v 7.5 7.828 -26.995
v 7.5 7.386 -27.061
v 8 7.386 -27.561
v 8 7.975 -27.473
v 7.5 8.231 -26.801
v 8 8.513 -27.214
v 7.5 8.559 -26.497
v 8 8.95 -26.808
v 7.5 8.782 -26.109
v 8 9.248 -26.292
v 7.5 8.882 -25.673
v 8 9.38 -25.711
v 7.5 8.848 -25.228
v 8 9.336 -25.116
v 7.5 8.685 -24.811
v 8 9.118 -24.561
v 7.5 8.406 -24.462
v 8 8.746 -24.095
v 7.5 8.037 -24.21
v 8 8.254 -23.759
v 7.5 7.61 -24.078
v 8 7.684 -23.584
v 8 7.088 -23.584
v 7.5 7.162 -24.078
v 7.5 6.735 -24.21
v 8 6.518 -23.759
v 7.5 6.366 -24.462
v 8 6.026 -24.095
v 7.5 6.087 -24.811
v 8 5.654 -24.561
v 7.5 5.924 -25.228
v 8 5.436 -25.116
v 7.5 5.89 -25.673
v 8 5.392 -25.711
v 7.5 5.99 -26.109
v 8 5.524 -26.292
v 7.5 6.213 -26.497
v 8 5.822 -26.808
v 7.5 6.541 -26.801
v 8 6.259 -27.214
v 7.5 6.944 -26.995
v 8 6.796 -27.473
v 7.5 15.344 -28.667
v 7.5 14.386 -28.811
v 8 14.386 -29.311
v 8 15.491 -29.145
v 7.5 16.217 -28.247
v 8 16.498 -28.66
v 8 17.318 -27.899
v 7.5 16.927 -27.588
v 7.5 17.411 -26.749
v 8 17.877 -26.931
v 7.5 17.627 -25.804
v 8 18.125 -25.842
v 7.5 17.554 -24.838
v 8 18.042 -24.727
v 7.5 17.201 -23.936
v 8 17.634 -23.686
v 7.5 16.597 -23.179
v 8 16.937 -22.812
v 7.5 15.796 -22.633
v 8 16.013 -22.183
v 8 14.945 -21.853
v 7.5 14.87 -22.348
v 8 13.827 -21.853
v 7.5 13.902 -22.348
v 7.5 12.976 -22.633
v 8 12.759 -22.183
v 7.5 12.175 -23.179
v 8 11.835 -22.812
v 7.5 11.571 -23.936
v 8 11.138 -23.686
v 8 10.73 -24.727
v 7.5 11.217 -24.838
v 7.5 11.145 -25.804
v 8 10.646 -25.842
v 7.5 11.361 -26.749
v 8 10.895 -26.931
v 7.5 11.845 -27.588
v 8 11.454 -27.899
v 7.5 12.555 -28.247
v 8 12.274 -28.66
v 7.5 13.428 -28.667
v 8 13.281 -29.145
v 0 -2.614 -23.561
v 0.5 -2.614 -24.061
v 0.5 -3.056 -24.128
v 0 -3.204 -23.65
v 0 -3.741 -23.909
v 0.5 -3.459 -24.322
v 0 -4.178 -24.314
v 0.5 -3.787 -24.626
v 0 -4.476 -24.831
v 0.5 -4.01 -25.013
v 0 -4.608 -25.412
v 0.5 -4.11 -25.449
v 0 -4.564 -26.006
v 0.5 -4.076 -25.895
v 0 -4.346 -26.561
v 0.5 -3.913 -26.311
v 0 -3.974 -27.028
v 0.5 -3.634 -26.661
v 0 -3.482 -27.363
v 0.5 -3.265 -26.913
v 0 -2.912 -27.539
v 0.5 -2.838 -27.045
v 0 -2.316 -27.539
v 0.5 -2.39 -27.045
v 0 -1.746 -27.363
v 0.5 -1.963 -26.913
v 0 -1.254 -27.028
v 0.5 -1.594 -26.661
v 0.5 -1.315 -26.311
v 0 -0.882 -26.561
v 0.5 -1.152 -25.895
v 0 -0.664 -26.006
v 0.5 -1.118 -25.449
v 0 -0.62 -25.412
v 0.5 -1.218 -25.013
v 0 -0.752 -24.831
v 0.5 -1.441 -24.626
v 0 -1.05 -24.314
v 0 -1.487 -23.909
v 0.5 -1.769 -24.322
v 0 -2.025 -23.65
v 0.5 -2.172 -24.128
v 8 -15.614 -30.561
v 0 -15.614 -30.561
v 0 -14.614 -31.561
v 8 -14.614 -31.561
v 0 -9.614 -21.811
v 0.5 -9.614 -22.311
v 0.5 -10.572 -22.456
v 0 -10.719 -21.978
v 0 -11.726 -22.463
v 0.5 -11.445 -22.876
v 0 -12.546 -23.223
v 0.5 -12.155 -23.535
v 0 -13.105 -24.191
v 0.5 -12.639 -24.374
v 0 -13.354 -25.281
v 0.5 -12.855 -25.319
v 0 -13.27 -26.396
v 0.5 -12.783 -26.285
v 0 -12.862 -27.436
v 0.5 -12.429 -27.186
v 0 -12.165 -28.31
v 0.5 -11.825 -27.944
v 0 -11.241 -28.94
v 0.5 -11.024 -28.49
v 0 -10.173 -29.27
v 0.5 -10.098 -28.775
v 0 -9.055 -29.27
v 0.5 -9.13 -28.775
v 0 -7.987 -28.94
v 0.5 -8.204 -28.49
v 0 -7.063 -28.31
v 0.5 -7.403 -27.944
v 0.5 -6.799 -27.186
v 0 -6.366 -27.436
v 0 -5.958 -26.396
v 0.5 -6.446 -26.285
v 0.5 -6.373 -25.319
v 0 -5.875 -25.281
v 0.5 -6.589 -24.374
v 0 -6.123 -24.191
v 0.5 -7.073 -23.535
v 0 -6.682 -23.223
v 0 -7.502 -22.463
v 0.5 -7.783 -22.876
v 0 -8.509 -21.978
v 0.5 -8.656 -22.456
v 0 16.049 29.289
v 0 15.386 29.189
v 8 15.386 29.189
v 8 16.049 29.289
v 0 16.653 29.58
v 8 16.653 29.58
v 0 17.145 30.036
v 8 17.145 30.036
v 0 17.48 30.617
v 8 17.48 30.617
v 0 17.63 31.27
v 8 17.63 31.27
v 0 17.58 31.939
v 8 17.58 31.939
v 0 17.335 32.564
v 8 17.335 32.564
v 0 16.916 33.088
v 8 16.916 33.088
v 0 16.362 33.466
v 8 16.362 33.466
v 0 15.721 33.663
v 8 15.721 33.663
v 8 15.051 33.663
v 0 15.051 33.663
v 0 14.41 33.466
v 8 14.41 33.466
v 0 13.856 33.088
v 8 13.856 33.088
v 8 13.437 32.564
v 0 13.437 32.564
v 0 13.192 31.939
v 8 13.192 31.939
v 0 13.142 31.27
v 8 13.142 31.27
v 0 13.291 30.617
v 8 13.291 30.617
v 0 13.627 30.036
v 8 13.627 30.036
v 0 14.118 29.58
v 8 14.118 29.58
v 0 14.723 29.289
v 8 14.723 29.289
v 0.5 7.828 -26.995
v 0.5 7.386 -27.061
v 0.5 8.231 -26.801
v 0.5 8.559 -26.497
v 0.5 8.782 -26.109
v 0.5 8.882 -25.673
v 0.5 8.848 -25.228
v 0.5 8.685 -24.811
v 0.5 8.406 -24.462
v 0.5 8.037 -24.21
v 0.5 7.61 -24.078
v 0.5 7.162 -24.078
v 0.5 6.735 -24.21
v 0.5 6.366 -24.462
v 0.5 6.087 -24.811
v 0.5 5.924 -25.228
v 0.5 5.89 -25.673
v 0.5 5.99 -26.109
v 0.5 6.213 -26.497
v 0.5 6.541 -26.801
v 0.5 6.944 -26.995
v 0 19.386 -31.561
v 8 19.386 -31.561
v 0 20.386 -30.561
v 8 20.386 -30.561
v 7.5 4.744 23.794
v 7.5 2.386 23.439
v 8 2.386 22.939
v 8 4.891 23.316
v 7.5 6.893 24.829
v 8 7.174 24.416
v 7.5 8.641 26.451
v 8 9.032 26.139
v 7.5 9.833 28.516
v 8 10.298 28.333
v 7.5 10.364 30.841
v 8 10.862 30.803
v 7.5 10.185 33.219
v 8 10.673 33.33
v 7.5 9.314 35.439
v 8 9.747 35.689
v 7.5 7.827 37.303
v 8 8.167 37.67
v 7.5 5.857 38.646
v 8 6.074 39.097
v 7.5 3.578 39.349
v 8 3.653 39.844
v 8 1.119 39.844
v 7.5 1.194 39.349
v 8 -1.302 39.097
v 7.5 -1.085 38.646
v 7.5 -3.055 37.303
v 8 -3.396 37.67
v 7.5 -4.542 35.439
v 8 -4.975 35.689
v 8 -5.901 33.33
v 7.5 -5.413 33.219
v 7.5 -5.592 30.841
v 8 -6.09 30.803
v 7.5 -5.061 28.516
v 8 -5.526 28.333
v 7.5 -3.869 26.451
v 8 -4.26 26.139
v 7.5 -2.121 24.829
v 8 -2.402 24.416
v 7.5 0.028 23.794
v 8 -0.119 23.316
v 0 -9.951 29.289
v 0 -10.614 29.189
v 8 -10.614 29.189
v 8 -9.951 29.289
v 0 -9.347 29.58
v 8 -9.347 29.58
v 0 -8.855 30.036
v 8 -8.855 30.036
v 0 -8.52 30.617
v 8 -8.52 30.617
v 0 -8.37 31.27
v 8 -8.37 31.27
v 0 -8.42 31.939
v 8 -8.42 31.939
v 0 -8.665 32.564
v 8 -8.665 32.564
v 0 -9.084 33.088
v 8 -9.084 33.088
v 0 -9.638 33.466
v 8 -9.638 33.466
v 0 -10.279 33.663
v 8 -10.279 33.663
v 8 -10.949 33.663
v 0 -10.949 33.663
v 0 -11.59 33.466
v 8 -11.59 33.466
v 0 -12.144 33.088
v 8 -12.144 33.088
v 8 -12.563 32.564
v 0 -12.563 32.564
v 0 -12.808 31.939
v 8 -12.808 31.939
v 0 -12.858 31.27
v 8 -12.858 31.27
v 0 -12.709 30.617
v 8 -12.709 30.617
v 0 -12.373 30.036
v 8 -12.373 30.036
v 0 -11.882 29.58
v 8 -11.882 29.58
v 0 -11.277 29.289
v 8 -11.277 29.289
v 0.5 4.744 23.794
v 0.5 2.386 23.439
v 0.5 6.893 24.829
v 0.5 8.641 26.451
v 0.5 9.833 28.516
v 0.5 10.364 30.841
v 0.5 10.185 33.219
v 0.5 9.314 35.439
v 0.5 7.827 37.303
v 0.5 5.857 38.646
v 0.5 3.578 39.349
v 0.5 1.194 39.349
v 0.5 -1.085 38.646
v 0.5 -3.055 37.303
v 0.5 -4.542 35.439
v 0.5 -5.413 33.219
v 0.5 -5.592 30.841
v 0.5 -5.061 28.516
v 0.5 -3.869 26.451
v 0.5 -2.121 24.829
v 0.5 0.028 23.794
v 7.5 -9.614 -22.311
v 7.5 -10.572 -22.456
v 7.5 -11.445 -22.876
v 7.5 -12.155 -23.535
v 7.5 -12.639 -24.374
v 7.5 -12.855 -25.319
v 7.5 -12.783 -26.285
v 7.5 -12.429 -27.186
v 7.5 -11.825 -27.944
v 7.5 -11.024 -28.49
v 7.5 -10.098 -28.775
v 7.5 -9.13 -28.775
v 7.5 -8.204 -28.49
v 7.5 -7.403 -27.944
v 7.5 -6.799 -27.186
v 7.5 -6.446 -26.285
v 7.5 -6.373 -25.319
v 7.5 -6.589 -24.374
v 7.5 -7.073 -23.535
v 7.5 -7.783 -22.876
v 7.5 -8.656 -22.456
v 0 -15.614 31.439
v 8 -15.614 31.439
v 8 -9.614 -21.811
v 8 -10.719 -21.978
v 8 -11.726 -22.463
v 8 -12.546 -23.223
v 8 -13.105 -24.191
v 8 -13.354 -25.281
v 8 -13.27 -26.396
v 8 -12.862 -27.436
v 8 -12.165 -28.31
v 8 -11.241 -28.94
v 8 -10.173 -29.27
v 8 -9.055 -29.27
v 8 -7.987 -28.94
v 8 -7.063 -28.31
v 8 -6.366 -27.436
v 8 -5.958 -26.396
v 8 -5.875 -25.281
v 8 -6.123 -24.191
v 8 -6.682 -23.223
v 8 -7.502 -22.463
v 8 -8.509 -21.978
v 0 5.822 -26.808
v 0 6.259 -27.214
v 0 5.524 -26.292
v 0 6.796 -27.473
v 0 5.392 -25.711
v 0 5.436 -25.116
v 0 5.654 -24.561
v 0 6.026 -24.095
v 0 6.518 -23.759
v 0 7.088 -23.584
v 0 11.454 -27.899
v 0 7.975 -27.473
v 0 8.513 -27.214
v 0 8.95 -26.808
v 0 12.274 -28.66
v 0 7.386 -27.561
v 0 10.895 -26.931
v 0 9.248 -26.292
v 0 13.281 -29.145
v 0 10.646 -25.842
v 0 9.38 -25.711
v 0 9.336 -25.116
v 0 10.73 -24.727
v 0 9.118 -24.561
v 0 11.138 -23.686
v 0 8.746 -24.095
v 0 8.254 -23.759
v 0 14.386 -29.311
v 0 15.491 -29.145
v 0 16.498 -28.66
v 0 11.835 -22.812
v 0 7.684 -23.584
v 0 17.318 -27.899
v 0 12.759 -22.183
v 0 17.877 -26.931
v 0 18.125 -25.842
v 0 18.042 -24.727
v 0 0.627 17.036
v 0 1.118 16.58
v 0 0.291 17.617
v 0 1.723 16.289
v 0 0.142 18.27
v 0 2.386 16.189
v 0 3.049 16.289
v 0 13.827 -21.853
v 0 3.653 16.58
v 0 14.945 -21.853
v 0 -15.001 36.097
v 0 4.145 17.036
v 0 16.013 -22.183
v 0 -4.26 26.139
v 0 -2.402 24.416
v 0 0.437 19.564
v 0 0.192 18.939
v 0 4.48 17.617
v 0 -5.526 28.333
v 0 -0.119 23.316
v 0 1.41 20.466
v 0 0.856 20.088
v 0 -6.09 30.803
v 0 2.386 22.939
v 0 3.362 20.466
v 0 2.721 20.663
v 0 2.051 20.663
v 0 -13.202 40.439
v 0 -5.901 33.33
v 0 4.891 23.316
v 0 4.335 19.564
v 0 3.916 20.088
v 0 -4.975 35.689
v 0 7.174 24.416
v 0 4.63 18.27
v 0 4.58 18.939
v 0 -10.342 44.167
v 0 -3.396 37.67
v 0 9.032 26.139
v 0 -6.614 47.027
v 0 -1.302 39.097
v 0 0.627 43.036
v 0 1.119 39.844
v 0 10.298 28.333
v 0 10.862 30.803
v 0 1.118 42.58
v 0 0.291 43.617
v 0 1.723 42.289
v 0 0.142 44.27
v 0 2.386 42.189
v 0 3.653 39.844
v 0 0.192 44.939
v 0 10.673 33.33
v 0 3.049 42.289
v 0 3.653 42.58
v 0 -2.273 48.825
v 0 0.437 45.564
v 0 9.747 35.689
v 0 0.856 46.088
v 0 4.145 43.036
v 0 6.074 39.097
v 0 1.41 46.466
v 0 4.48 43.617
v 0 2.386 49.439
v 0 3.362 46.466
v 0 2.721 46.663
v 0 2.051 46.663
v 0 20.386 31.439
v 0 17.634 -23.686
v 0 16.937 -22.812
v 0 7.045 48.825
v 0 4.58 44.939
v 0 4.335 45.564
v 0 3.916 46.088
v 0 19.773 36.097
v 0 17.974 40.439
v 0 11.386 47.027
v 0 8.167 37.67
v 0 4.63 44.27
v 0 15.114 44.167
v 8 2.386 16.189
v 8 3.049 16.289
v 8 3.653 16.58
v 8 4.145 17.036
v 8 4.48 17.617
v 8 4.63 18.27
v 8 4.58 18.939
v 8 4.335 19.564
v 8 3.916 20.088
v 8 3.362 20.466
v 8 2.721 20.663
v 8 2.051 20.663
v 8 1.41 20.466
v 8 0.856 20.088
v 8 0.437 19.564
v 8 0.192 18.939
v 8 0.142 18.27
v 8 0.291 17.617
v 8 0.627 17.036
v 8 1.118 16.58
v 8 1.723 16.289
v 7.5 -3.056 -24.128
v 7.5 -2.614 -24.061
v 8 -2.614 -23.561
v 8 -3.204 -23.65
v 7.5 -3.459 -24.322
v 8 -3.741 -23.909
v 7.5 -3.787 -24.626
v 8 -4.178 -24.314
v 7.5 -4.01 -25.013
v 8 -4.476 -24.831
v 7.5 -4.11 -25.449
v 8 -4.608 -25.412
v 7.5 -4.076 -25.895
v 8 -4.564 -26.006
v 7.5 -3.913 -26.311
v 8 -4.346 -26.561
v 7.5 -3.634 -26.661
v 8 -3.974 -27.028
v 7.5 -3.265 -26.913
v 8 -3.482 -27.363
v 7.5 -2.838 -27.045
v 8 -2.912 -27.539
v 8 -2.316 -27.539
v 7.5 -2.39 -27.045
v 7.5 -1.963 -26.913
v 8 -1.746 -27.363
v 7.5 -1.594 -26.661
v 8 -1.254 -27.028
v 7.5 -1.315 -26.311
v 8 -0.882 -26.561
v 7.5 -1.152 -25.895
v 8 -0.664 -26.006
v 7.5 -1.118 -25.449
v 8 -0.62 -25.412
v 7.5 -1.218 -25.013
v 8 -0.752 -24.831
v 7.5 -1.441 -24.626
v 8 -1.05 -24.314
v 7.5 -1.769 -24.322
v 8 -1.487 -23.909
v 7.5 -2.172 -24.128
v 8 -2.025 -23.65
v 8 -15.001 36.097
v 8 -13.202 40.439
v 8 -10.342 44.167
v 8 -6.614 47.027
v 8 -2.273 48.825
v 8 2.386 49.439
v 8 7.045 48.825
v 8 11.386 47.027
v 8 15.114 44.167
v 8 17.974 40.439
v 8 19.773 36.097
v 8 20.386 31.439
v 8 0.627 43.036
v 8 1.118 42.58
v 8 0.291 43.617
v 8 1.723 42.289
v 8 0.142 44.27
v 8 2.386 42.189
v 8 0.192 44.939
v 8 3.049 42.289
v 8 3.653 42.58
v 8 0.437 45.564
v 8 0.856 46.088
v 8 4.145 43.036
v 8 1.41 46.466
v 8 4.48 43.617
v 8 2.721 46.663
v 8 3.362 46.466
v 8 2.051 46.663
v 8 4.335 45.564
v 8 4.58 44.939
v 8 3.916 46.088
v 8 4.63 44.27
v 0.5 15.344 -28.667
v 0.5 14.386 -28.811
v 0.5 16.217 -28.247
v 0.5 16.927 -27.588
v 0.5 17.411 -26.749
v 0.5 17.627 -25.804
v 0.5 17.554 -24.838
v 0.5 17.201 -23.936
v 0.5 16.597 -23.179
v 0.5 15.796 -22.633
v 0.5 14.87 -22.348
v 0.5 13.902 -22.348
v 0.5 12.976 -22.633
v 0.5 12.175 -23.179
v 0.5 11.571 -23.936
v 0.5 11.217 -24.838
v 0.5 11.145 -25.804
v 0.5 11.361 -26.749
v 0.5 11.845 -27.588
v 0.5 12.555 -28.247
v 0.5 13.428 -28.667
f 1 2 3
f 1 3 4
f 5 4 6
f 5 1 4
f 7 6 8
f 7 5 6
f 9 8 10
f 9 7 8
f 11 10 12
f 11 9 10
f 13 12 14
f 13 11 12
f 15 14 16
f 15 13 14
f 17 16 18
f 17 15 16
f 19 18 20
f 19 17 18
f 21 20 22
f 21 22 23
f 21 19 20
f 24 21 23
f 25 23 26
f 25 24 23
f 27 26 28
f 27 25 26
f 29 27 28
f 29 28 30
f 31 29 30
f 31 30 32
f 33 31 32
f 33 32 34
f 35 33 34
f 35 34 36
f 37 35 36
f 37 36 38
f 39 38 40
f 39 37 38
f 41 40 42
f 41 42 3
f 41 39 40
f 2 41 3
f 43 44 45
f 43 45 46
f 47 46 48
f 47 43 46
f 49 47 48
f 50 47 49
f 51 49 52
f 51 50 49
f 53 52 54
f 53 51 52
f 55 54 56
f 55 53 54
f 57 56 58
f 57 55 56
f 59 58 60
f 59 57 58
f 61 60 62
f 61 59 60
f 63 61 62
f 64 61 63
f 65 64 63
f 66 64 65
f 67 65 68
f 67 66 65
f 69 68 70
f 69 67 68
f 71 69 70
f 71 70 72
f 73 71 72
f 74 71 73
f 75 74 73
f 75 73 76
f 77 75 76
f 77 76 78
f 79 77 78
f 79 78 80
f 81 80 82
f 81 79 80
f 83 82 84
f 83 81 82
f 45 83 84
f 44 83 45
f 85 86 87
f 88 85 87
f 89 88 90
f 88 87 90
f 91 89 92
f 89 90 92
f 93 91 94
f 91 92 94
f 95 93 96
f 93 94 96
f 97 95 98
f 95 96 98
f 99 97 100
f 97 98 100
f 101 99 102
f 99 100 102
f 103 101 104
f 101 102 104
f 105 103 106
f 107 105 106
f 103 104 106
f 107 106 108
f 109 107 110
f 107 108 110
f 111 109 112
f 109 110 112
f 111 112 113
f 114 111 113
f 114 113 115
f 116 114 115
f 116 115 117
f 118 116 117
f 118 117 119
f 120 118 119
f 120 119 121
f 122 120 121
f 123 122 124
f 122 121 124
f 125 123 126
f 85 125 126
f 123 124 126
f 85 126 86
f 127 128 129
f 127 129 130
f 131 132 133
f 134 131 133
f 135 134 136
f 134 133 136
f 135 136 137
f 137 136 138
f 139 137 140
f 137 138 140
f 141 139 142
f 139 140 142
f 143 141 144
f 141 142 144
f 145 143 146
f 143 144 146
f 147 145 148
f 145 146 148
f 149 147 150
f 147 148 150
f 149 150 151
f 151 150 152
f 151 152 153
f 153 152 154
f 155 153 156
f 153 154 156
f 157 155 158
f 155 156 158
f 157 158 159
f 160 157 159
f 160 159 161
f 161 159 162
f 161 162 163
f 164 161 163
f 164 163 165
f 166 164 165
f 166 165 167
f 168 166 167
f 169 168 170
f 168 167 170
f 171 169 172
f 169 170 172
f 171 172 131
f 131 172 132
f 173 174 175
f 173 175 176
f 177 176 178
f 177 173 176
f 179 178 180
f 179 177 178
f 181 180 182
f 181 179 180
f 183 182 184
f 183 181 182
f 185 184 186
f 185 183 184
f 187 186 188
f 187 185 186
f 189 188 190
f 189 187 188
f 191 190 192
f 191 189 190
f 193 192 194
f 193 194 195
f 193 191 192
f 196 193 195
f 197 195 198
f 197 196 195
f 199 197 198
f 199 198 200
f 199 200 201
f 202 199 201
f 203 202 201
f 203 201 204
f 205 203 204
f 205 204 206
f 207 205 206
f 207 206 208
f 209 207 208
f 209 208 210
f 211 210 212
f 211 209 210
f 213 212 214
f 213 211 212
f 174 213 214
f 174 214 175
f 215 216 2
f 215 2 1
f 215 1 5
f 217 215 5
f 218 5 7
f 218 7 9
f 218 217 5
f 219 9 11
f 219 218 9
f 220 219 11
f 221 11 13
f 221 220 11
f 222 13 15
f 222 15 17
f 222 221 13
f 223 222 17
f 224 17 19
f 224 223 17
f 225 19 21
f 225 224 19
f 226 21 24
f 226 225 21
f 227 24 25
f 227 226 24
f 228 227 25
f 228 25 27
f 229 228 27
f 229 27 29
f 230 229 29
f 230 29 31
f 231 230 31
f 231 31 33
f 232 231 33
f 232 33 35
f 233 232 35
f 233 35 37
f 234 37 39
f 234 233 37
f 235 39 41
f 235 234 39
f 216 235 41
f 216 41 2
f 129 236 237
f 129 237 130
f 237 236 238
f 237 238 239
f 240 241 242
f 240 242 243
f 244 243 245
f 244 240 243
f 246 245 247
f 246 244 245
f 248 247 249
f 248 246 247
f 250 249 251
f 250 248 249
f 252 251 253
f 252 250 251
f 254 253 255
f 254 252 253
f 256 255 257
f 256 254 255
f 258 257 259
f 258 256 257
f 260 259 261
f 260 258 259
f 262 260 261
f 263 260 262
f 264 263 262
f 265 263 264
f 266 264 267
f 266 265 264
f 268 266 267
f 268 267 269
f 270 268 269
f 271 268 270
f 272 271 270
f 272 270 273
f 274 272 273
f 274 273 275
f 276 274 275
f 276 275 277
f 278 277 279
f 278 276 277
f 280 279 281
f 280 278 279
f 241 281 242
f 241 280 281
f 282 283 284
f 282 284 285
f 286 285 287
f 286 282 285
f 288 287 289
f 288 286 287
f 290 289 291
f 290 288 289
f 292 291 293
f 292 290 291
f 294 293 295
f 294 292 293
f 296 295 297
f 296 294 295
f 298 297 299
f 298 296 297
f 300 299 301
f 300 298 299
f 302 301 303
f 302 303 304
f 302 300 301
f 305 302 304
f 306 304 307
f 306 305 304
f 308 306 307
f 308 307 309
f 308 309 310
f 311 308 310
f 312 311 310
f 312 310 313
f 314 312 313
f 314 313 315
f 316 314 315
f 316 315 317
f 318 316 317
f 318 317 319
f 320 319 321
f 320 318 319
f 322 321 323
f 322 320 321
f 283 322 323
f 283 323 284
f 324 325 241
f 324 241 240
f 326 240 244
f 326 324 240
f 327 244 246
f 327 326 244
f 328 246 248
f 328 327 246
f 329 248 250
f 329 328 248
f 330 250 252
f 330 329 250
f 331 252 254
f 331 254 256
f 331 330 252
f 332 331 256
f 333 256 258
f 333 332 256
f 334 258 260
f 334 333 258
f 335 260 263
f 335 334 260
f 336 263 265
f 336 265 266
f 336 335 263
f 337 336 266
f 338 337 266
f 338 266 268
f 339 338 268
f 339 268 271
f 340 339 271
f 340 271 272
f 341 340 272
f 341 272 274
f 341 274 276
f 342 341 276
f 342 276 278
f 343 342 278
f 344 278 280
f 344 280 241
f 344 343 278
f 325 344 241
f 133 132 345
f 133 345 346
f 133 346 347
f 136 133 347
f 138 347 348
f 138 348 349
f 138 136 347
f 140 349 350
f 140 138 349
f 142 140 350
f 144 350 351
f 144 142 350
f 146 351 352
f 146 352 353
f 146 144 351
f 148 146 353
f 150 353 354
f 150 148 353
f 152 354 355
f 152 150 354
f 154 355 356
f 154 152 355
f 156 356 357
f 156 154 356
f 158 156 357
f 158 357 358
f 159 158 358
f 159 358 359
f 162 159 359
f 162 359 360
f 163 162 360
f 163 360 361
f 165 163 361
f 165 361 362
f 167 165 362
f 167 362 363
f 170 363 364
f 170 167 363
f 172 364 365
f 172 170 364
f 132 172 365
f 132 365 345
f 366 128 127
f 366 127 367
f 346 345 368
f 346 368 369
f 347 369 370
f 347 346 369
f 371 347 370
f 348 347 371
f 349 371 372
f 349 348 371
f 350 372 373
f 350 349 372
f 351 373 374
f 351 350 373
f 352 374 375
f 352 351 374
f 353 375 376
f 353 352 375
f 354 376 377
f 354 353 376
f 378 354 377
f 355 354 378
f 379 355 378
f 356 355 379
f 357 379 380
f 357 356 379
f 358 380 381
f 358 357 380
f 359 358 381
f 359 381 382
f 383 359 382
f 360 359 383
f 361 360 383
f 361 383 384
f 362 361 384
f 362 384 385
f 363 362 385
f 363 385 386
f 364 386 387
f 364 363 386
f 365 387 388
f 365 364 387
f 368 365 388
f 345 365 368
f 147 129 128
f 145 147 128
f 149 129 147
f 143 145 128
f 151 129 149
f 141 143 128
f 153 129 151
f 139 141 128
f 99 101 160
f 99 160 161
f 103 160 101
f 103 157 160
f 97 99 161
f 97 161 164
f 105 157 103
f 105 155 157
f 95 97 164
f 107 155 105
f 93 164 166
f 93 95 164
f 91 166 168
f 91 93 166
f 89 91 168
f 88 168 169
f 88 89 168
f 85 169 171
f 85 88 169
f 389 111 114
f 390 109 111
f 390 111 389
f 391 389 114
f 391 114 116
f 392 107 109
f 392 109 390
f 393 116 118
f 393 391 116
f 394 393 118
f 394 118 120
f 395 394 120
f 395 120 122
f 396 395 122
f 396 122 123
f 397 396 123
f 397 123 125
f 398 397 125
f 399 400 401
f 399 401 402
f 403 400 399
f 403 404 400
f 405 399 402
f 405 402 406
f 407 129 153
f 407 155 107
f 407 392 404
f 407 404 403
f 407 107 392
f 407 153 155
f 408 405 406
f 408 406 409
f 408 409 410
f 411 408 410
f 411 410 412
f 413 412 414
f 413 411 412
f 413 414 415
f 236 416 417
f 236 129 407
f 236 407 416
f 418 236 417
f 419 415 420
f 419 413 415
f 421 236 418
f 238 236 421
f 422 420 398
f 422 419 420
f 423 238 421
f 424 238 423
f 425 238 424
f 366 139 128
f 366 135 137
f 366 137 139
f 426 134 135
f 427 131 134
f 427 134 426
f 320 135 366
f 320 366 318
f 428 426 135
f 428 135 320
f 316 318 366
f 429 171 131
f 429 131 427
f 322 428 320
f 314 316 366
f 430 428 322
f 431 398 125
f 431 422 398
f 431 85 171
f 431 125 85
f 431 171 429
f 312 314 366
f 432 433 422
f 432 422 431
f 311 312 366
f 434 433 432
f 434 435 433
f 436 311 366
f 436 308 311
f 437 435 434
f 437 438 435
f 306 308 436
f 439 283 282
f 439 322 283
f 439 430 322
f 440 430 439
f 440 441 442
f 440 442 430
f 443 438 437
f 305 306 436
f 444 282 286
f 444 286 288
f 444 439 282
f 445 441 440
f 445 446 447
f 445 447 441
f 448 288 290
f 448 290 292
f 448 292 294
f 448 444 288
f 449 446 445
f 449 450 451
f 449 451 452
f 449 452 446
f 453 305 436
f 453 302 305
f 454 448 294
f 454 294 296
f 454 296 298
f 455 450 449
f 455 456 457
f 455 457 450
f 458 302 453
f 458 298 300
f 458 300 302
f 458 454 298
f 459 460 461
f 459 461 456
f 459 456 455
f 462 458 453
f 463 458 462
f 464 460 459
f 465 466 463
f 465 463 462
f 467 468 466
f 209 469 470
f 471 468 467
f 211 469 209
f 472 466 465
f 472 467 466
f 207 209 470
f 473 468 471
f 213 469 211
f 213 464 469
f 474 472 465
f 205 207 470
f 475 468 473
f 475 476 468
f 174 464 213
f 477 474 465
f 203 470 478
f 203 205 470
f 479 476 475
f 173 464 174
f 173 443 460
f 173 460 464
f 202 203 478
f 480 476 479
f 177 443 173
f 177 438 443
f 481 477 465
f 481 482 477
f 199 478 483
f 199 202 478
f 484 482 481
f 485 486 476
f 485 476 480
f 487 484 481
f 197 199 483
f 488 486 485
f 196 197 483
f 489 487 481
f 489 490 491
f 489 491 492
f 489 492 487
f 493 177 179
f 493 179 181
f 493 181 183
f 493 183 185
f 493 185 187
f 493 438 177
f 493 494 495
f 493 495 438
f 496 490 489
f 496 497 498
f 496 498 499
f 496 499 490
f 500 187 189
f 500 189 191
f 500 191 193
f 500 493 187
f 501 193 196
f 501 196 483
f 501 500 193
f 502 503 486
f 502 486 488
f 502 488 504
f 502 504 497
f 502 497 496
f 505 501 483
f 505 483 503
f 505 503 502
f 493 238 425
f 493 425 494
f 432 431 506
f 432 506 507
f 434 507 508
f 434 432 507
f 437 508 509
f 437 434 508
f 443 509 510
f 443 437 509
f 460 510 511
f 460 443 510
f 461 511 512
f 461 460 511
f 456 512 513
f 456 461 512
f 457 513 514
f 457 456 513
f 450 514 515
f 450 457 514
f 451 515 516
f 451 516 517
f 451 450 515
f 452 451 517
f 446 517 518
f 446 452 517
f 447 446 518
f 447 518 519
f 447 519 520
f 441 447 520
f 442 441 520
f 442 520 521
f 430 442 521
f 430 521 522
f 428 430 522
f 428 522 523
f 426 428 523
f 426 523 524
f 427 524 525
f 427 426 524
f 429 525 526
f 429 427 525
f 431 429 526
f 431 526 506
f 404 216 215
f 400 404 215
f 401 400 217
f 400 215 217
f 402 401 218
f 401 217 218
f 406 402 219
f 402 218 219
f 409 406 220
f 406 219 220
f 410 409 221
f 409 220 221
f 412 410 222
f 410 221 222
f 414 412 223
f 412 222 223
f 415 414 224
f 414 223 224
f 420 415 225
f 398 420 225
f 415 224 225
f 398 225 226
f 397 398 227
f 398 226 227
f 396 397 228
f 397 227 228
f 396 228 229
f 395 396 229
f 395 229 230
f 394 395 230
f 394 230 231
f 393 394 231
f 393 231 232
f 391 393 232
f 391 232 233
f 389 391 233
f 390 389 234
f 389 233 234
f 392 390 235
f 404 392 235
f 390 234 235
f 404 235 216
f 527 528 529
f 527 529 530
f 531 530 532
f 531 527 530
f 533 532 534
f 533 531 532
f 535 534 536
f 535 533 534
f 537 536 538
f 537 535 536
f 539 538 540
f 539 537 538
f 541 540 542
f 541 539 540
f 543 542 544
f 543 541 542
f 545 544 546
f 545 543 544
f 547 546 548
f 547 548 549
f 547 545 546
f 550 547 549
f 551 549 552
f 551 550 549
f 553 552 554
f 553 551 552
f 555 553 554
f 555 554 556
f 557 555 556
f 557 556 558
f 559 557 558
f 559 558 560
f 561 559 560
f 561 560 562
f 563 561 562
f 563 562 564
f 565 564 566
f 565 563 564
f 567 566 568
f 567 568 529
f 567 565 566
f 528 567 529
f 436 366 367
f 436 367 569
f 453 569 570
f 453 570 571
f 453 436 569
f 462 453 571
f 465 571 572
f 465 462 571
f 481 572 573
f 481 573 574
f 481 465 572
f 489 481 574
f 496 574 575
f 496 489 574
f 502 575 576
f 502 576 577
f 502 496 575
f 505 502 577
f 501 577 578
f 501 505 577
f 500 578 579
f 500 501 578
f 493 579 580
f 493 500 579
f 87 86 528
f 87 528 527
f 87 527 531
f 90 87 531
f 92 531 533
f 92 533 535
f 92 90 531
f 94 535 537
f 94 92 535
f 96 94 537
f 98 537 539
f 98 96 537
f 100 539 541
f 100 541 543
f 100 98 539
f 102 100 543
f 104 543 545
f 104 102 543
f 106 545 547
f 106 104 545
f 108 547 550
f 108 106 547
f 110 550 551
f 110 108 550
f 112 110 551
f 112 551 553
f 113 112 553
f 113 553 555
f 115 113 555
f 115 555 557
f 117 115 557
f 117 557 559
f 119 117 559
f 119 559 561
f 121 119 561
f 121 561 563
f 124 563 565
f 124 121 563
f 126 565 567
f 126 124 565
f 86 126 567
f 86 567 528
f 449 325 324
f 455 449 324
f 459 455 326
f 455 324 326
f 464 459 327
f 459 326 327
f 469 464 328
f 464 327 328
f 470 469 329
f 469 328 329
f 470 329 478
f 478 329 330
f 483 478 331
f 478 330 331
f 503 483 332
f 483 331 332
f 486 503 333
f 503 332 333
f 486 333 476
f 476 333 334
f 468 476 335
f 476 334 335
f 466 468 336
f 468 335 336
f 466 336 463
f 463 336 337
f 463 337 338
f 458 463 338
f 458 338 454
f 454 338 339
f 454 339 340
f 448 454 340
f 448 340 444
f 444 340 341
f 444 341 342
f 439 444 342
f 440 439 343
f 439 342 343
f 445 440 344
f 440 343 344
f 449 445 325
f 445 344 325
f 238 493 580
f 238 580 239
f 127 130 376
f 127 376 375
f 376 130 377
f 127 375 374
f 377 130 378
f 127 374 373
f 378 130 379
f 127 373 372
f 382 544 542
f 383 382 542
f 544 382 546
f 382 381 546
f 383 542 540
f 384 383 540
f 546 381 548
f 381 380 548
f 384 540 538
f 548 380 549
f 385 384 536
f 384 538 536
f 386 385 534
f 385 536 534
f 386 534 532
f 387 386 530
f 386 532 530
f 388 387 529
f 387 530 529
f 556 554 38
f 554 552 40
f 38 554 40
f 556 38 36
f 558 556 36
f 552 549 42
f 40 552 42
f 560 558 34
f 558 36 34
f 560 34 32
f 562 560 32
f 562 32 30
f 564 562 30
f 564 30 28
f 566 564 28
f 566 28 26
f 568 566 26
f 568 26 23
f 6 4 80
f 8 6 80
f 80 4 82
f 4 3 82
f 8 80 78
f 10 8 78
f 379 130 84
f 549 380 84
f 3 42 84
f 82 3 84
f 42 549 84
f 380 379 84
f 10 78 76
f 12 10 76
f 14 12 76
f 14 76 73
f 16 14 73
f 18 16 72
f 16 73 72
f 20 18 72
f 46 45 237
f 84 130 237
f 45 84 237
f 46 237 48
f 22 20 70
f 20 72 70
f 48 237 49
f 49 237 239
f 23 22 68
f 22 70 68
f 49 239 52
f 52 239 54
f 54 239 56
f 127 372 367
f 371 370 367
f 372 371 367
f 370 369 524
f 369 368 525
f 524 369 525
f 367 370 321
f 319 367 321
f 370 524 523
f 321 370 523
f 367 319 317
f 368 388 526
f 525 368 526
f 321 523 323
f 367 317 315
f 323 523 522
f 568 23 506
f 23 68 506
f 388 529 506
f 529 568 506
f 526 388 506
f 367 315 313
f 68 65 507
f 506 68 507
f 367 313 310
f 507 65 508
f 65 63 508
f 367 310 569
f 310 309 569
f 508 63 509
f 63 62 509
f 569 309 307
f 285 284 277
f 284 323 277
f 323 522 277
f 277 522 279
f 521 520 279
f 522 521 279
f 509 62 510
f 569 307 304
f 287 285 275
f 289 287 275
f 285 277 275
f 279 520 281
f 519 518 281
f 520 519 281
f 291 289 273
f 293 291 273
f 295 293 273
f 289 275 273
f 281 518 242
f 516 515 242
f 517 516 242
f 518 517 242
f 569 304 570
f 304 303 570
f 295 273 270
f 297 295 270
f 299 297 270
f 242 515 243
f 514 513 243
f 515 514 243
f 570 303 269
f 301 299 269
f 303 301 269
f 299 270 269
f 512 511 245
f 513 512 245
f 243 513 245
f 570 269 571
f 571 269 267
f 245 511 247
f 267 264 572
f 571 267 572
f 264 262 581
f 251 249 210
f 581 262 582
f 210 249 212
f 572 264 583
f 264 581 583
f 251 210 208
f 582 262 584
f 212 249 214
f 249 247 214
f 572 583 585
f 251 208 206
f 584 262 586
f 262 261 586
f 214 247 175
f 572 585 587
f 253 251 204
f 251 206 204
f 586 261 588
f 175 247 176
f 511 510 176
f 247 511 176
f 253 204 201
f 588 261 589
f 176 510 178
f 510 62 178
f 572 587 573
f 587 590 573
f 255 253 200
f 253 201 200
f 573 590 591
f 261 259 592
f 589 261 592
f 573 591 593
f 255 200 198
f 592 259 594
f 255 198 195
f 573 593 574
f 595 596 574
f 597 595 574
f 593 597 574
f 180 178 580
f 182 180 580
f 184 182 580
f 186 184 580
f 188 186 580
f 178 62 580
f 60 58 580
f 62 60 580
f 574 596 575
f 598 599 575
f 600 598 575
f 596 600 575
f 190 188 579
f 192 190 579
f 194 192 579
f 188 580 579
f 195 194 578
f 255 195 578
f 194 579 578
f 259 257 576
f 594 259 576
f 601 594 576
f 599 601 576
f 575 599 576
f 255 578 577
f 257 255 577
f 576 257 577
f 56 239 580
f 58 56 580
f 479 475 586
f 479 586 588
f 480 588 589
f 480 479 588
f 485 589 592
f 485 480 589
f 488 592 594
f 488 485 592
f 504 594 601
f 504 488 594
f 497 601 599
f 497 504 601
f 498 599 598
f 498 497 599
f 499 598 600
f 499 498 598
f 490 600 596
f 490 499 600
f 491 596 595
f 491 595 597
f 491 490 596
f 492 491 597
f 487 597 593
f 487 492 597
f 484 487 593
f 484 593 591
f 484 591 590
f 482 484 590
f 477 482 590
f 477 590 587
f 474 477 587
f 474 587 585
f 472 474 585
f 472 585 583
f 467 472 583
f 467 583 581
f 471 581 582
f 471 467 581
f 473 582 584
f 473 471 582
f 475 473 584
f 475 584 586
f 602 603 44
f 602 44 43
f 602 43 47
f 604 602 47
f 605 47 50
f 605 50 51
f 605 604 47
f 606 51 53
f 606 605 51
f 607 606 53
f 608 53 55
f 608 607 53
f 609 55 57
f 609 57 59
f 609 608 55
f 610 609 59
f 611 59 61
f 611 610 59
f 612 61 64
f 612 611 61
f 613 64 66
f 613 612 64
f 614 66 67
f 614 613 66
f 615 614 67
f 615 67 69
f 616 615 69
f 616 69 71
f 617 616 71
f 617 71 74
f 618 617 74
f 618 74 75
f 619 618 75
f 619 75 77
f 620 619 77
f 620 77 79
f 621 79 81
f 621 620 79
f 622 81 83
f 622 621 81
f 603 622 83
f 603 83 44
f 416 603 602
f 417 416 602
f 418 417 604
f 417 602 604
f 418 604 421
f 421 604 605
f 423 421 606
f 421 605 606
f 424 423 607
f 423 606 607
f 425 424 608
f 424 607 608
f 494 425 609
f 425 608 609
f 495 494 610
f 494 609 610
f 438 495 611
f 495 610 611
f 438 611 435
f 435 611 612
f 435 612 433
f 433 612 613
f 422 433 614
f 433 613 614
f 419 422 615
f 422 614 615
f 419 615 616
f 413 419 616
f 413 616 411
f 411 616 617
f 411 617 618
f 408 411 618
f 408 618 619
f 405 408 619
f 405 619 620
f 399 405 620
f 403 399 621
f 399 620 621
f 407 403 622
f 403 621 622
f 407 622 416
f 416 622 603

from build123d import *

# Parameters (mm, degrees)
SKETCH1_R           = 8
SKETCH1_R_2         = 2.25
SKETCH1_R_3         = 3.25
SKETCH1_R_4         = 1.5
BOSS_EXTRUDE1_DEPTH = 8
CHAMFER1_SIZE       = 1
CHAMFER2_SIZE       = 0.5


with BuildPart() as part:
    # Sketch1 → Boss-Extrude1 (new body)
    with BuildSketch(Plane(origin=(0, 0, 0), x_dir=(0, 0, -1), z_dir=(1, 0, 0))):
        with BuildLine():
            Line((-31.438596491, 20.385964912), (31.561403509, 20.385964912))
            Line((31.561403509, 20.385964912), (31.561403509, -15.614035088))
            Line((31.561403509, -15.614035088), (-31.438596491, -15.614035088))
            ThreePointArc((-31.438596491, -15.614035088), (-49.438596491, 2.385964912), (-31.438596491, 20.385964912))
        make_face()
        with Locations((-31.438596491, 2.385964912)):
            Circle(SKETCH1_R, mode=Mode.SUBTRACT)
        with Locations((-31.438596491, 15.385964912)):
            Circle(SKETCH1_R_2, mode=Mode.SUBTRACT)
        with Locations((-18.438596491, 2.385964912)):
            Circle(SKETCH1_R_2, mode=Mode.SUBTRACT)
        with Locations((-31.438596491, -10.614035088)):
            Circle(SKETCH1_R_2, mode=Mode.SUBTRACT)
        with Locations((-44.438596491, 2.385964912)):
            Circle(SKETCH1_R_2, mode=Mode.SUBTRACT)
        with Locations((25.561403509, 14.385964912)):
            Circle(SKETCH1_R_3, mode=Mode.SUBTRACT)
        with Locations((25.561403509, 7.385964912)):
            Circle(SKETCH1_R_4, mode=Mode.SUBTRACT)
        with Locations(Location((25.561403509, -2.614035088, 0), (0, 0, 180))):
            Circle(SKETCH1_R_4, mode=Mode.SUBTRACT)
        with Locations(Location((25.561403509, -9.614035088, 0), (0, 0, 180))):
            Circle(SKETCH1_R_3, mode=Mode.SUBTRACT)
    extrude(amount=BOSS_EXTRUDE1_DEPTH)

    # Chamfer1
    chamfer1_edges = [part.edges().sort_by_distance(p)[0] for p in [
        (4, 20.385964912, -31.561403509),
        (4, -15.614035088, -31.561403509),
    ]]
    chamfer(chamfer1_edges, length=CHAMFER1_SIZE)

    # Chamfer2
    chamfer2_edges = [part.edges().sort_by_distance(p)[0] for p in [
        (0, 2.385964912, 39.438596491),
        (8, 2.385964912, 39.438596491),
        (0, 14.385964912, -22.311403509),
        (8, 14.385964912, -22.311403509),
        (0, 7.385964912, -24.061403509),
        (8, 7.385964912, -24.061403509),
        (0, -2.614035088, -27.061403509),
        (8, -2.614035088, -27.061403509),
        (0, -9.614035088, -28.811403509),
        (8, -9.614035088, -28.811403509),
    ]]
    chamfer(chamfer2_edges, length=CHAMFER2_SIZE)


solid = part.part
